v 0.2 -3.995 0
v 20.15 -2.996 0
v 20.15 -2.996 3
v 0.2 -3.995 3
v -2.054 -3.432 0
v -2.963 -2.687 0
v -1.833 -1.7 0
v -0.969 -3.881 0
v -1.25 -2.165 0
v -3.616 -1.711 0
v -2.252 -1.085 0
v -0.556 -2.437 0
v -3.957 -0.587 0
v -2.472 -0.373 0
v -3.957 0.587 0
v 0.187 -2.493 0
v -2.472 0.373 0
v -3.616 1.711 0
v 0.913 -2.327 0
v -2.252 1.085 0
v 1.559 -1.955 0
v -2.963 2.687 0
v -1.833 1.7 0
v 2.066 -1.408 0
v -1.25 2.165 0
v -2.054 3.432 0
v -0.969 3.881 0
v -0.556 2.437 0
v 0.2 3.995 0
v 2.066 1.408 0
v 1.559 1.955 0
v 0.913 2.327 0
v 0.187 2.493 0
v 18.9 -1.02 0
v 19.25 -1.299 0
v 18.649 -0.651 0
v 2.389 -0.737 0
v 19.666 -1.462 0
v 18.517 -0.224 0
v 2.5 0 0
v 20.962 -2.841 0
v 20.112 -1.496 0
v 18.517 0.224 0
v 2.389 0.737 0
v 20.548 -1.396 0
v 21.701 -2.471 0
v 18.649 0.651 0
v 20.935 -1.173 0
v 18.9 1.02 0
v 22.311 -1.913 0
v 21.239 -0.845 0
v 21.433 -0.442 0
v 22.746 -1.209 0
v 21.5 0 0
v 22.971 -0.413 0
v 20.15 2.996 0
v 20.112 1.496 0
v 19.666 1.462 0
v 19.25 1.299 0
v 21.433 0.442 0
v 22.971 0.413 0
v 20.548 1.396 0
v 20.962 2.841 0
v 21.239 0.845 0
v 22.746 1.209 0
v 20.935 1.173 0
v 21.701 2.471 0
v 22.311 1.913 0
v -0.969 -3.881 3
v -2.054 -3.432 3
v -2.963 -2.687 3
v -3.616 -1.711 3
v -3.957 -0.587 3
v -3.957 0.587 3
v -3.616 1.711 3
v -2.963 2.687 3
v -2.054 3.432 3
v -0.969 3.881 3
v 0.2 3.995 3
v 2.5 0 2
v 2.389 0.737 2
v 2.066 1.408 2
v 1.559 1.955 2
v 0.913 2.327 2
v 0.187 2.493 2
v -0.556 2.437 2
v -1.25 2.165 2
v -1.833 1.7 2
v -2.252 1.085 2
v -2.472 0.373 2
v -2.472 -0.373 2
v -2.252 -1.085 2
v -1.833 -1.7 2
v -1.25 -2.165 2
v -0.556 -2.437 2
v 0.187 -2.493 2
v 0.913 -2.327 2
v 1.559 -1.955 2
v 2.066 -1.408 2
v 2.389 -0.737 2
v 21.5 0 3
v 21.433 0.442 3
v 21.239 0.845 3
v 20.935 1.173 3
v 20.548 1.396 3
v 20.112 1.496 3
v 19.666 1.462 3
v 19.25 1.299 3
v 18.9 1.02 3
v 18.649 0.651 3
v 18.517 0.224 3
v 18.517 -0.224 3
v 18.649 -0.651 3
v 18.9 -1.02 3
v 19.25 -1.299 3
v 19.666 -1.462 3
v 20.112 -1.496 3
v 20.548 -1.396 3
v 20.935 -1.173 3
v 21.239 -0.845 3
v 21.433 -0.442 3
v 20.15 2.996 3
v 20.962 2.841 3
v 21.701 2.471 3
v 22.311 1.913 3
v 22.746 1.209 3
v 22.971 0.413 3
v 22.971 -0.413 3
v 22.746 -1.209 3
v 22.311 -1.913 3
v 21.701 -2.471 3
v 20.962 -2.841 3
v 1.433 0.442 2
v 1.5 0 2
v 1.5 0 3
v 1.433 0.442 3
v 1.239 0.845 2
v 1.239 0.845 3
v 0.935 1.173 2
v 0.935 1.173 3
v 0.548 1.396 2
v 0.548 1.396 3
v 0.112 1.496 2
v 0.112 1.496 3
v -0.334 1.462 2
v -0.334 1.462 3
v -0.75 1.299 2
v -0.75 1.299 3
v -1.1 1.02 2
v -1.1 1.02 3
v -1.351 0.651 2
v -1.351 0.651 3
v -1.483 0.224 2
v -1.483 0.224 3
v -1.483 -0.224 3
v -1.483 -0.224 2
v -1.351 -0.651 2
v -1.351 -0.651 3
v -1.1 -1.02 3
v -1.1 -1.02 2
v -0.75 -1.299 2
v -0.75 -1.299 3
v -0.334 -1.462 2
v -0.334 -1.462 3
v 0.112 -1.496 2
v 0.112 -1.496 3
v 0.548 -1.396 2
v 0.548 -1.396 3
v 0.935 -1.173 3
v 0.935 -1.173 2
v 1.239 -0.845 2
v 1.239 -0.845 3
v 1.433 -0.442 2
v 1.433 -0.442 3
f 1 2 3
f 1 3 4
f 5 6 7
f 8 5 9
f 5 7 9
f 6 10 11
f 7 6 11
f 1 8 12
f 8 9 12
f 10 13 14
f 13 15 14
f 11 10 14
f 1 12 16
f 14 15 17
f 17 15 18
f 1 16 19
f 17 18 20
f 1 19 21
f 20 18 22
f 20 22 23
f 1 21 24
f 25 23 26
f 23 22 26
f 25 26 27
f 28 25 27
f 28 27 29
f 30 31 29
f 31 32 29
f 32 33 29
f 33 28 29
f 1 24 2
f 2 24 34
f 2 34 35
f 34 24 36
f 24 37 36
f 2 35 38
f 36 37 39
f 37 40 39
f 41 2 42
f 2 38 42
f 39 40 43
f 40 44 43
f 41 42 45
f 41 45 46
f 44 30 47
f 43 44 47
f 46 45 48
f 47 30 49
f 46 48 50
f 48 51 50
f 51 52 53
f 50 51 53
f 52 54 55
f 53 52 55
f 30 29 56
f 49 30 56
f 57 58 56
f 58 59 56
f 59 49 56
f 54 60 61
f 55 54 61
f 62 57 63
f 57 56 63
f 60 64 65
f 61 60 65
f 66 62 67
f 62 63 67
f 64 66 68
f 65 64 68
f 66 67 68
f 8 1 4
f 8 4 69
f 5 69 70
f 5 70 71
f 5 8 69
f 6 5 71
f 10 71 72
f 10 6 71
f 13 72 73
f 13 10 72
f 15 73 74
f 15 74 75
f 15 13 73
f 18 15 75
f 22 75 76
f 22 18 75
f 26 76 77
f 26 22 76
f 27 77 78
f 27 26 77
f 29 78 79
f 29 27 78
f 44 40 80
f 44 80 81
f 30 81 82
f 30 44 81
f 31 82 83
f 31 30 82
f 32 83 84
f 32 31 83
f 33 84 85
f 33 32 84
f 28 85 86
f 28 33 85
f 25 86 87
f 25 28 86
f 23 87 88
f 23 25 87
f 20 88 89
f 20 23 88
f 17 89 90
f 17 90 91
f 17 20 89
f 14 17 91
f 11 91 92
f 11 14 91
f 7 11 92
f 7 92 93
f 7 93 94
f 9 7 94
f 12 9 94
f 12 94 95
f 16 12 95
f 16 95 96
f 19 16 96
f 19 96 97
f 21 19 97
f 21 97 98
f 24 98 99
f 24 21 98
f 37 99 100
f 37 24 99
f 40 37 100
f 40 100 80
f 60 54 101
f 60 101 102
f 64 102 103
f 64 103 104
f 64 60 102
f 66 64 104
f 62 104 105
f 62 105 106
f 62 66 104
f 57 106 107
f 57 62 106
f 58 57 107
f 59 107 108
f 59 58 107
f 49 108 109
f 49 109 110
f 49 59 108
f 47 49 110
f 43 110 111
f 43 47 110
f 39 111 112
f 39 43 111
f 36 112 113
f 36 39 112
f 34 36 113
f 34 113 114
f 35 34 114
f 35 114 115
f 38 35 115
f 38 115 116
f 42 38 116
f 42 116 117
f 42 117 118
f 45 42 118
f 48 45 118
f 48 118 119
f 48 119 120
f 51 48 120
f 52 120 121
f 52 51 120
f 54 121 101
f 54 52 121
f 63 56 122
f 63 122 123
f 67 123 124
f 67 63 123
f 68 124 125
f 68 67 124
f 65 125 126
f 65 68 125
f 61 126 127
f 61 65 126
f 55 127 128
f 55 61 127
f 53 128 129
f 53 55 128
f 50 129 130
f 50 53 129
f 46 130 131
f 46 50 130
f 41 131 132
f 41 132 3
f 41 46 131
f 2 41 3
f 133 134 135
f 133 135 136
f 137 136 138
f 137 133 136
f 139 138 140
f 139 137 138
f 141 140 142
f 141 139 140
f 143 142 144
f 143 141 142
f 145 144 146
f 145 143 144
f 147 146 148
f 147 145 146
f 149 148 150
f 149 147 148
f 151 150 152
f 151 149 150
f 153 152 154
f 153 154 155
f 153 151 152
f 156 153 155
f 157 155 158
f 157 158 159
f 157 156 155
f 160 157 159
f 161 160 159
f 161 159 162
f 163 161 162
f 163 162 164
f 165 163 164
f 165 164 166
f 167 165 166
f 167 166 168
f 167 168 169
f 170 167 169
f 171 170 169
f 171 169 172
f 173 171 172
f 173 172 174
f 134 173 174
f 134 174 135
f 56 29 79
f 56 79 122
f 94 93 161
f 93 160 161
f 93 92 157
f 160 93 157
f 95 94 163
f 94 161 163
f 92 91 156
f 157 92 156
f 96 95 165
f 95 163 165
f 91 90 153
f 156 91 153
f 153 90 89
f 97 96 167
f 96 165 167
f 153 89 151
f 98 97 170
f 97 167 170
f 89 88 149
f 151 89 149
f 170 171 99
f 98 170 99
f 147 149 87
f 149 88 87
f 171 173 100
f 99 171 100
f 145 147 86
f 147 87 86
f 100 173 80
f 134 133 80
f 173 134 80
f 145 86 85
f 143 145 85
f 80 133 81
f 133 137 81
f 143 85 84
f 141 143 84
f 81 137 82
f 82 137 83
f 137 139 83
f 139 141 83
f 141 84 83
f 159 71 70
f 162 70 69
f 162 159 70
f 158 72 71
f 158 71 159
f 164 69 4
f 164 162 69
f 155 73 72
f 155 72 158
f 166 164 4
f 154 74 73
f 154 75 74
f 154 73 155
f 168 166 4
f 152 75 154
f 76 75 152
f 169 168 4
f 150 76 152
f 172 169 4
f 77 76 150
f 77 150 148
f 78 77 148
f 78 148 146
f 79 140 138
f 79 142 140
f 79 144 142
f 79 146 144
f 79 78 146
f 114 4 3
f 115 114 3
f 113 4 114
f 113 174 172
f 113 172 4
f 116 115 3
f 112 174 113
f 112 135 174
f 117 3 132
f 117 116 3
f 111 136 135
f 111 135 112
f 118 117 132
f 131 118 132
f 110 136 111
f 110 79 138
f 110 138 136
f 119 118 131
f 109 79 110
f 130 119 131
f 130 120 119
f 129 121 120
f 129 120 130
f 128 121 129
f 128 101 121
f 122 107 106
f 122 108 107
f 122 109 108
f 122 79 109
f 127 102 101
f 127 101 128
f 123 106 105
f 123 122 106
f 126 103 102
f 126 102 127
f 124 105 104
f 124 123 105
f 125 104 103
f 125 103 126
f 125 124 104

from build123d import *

# Parameters (mm, degrees)
ESQUISSE1_R             = 1.5
BOSS_EXTRU_1_DEPTH      = 3
ESQUISSE1_4_R           = 2.5
ESQUISSE1_4_R_2         = 1.5
ENL_V_MAT_EXTRU_1_DEPTH = 2


with BuildPart() as part:
    # Esquisse1 → Boss.-Extru.1 (new body)
    with BuildSketch(Plane.XY):
        with BuildLine():
            Line((20.15, 2.996247653), (0.2, 3.994996871))
            ThreePointArc((0.2, 3.994996871), (-4, 0), (0.2, -3.994996871))
            Line((0.2, -3.994996871), (20.15, -2.996247653))
            ThreePointArc((20.15, -2.996247653), (23, 0), (20.15, 2.996247653))
        make_face()
        with Locations((20, 0)):
            Circle(ESQUISSE1_R, mode=Mode.SUBTRACT)
        Circle(ESQUISSE1_R, mode=Mode.SUBTRACT)
    extrude(amount=BOSS_EXTRU_1_DEPTH)

    # Esquisse1<4> → Enlèv. mat.-Extru.1 (cut)
    with BuildSketch(Plane.XY):
        Circle(ESQUISSE1_4_R)
        Circle(ESQUISSE1_4_R_2, mode=Mode.SUBTRACT)
    extrude(amount=ENL_V_MAT_EXTRU_1_DEPTH, mode=Mode.SUBTRACT)


solid = part.part
